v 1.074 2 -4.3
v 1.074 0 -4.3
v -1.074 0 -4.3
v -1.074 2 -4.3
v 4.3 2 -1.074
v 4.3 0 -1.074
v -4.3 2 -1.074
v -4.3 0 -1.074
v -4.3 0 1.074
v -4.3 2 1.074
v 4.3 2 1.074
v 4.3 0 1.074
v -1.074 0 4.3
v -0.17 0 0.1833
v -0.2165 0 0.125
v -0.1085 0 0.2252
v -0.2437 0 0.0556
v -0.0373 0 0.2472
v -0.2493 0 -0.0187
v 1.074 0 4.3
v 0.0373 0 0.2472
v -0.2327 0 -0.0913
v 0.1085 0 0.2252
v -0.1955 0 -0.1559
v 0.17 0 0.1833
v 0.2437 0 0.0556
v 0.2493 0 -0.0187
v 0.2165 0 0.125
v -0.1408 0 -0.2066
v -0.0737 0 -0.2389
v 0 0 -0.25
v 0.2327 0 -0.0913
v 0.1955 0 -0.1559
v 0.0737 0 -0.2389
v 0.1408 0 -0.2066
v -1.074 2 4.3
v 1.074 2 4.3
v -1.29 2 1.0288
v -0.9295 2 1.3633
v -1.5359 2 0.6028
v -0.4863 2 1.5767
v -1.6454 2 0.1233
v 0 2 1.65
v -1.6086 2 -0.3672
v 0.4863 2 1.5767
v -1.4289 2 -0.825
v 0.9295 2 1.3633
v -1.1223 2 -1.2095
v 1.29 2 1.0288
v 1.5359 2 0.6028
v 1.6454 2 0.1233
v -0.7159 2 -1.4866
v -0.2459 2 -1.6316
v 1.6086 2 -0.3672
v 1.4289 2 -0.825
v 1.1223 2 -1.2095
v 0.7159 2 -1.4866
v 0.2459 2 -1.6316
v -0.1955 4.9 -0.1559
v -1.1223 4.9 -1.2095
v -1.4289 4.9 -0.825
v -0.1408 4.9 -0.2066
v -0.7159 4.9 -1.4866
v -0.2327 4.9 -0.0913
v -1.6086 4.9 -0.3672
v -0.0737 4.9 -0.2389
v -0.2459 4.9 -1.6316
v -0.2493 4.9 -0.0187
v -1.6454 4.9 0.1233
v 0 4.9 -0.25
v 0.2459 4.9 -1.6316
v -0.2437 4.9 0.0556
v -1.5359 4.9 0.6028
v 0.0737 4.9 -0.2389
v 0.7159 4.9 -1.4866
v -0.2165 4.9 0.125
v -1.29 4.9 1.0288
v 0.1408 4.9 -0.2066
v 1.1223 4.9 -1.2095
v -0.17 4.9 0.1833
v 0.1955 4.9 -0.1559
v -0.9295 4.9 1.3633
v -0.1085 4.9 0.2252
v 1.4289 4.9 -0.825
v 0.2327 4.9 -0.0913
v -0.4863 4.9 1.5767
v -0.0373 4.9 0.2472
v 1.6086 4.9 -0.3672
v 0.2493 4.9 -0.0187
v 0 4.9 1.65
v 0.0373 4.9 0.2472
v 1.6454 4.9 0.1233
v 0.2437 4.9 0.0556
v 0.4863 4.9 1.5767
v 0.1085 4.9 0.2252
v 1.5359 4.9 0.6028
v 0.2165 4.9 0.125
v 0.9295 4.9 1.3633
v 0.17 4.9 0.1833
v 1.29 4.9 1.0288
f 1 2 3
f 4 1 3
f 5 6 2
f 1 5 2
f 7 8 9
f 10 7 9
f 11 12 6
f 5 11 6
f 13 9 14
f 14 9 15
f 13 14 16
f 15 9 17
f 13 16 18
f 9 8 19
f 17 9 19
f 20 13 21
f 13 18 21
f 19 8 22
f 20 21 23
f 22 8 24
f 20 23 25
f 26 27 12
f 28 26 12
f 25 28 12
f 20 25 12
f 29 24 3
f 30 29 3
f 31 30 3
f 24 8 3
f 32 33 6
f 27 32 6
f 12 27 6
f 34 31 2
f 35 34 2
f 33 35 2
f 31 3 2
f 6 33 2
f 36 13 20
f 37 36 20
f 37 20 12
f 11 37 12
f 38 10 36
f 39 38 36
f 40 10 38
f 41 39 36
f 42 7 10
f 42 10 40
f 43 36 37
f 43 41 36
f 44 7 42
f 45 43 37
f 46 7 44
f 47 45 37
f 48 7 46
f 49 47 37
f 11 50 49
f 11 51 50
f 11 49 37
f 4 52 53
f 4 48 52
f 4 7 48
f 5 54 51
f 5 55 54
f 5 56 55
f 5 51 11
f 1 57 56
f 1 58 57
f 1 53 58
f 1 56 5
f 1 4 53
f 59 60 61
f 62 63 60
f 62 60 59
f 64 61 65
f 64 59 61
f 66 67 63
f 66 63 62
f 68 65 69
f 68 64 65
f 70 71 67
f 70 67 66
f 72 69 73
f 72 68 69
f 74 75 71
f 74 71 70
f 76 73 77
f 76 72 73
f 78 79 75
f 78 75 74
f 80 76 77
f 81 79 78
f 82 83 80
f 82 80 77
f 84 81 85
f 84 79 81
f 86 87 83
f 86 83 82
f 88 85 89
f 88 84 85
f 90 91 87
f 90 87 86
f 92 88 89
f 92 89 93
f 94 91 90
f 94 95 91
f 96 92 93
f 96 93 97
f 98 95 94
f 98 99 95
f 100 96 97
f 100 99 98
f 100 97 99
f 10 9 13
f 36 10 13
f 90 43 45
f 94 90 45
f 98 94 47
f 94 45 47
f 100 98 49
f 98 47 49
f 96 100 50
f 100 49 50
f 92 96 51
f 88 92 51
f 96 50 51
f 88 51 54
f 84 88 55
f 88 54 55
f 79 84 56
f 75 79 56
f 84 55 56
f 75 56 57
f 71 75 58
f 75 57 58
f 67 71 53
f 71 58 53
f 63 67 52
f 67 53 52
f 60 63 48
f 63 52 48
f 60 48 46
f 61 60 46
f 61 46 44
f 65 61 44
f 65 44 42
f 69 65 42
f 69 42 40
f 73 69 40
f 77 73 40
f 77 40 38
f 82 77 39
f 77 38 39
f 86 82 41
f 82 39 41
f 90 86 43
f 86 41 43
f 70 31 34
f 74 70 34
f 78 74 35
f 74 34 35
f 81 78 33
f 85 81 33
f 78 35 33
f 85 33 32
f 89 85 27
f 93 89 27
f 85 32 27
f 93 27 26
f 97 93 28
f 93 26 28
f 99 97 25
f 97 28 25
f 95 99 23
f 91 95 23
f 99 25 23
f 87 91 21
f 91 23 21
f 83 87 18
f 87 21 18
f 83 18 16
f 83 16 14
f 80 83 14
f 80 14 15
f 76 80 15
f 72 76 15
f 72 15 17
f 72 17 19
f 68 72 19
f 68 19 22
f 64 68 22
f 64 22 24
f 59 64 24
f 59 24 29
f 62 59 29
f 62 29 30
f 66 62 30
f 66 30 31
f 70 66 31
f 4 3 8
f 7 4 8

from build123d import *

# Parameters (mm, degrees)
EXTRUDE_1_DEPTH     = 2
SKETCH_2_R          = 1.65
EXTRUDE_2_DEPTH     = 2.9
SKETCH_3_R          = 0.25
CUT_EXTRUDE_1_DEPTH = 10


with BuildPart() as part:
    # 草图1 → 凸台-拉伸1 (new body)
    with BuildSketch(Plane(origin=(0, 0, 0), x_dir=(1, 0, 0), z_dir=(0, 1, 0))):
        Polygon((-4.3, -1.074011537), (-1.074011537, -4.3), (1.074011537, -4.3), (4.3, -1.074011537), (4.3, 1.074011537), (1.074011537, 4.3), (-1.074011537, 4.3), (-4.3, 1.074011537), align=None)
    extrude(amount=EXTRUDE_1_DEPTH)

    # 草图2 → 凸台-拉伸2 (add)
    with BuildSketch(Plane(origin=(0, 2, 0), x_dir=(1, 0, 0), z_dir=(0, 1, 0))):
        with Locations(Location((0, 0, 0), (0, 0, 270))):
            Circle(SKETCH_2_R)
    extrude(amount=EXTRUDE_2_DEPTH)

    # 草图3 → 切除-拉伸1 (cut)
    with BuildSketch(Plane.XZ):
        with Locations(Location((0, 0, 0), (0, 0, 270))):
            Circle(SKETCH_3_R)
    extrude(amount=-CUT_EXTRUDE_1_DEPTH, mode=Mode.SUBTRACT)


solid = part.part
